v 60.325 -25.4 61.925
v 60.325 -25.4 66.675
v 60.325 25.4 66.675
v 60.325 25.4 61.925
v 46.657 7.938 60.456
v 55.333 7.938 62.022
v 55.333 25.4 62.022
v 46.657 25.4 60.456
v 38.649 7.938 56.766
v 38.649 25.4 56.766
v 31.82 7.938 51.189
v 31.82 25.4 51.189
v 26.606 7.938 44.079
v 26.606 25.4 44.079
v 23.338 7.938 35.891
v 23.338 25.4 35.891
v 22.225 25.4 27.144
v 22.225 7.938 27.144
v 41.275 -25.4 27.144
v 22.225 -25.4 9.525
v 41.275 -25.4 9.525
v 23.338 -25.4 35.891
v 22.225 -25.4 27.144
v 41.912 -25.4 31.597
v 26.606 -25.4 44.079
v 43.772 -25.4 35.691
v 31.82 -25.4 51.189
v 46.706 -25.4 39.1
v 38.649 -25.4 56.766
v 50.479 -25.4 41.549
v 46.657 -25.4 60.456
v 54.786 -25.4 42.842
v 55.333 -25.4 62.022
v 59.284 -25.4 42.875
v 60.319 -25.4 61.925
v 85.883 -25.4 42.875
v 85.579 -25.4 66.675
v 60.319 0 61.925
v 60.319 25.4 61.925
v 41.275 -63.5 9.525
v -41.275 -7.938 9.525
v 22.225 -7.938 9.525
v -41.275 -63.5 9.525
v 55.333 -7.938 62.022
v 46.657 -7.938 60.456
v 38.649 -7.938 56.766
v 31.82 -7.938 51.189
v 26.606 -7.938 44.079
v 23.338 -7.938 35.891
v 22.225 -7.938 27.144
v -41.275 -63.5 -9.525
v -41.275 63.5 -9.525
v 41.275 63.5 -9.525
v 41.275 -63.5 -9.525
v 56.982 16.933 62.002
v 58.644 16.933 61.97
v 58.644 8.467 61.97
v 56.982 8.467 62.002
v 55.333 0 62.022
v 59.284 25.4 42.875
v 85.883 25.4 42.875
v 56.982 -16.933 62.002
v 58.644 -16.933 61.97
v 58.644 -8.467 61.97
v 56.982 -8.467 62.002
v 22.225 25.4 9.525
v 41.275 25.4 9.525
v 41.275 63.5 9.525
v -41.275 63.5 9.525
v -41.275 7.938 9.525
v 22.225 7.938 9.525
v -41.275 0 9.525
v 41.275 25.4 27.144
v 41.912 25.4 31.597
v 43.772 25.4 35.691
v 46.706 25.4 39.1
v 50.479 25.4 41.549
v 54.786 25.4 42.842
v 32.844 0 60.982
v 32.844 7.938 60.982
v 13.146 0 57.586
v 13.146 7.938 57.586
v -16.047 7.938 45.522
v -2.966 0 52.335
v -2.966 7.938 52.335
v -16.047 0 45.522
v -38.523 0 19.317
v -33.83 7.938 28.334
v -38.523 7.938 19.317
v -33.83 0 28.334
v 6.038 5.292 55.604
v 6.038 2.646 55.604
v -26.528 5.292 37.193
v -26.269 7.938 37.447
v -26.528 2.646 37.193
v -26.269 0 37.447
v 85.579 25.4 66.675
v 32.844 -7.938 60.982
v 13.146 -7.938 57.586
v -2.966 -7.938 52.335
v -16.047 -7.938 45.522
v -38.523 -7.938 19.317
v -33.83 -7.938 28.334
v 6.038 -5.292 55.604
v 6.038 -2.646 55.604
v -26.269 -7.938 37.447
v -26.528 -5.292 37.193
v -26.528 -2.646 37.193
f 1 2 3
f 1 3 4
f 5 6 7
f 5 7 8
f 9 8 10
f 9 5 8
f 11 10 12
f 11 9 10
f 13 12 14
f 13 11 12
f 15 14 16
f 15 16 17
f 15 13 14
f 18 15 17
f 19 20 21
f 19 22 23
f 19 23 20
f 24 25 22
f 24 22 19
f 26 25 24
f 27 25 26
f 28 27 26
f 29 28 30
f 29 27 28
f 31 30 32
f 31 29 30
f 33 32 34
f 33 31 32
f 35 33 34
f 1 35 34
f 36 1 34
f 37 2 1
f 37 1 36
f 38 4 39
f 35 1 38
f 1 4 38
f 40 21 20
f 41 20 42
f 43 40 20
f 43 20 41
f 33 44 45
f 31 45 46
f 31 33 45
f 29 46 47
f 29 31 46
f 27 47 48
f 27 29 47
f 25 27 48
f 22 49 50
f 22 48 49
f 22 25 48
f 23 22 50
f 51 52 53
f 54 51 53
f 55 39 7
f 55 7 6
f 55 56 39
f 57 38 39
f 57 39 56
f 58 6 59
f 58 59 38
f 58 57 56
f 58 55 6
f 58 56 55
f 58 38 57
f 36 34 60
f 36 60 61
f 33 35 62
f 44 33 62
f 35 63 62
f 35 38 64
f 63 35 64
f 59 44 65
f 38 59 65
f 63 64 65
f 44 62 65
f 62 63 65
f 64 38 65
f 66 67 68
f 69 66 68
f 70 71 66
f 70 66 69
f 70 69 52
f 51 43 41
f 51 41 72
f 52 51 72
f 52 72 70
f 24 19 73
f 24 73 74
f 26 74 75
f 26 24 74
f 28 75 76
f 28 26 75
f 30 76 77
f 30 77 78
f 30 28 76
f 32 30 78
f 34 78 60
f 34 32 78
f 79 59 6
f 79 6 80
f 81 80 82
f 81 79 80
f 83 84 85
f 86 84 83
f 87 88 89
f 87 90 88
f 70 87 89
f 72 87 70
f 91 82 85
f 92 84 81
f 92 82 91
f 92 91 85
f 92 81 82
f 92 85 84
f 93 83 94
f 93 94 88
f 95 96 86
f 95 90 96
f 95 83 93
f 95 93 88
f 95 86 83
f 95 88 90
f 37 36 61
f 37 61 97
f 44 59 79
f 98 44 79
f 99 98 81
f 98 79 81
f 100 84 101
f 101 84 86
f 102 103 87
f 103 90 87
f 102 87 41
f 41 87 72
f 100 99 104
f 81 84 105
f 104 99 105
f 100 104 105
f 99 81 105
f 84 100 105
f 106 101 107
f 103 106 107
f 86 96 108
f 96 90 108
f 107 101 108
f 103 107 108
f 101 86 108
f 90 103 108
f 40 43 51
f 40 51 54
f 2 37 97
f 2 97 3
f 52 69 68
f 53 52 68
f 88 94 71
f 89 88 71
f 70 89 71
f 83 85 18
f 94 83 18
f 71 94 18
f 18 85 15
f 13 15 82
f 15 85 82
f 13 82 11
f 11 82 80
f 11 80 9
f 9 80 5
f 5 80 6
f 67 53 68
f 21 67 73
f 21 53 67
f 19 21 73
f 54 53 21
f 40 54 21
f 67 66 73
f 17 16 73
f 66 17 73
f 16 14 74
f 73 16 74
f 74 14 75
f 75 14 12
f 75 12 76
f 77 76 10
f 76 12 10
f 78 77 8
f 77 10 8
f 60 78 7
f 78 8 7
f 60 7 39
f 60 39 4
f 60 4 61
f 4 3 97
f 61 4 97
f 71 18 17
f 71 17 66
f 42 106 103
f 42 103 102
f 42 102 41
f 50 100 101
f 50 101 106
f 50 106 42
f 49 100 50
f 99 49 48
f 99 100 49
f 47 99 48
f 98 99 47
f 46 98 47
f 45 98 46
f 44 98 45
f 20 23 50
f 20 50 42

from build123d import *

# Parameters (mm, degrees)
F1_DEPTH = 63.5
F2_DEPTH = 25.4
F3_DEPTH = 7.9375


with BuildPart() as f1:
    # F0 (on Front) → F1 (new body, symmetric)
    with BuildSketch(Plane.XZ):
        Polygon((-41.275, 9.525), (-41.275, -9.525), (41.275, -9.525), (41.275, 9.525), (22.225, 9.525), align=None)
    extrude(amount=F1_DEPTH, both=True)

    # F0 (on Front) → F2 (join, symmetric)
    with BuildSketch(Plane.XZ):
        with BuildLine():
            Line((22.225, 9.525), (41.275, 9.525))
            Line((41.275, 9.525), (41.275, 27.144268))
            ThreePointArc((41.275, 27.144268), (46.70633, 39.100244), (59.283867, 42.8752))
            Line((59.283867, 42.8752), (60.325, 42.8752))
            Line((60.325, 42.8752), (60.325, 61.9252))
            Line((60.325, 61.9252), (60.318968, 61.9252))
            add(Edge.make_bspline(
                [(60.318968, 61.9252), (58.637809, 61.975807), (56.975817, 62.007969), (55.33311, 62.021976)],
                knots=[0, 0, 0, 0, 3.185994, 3.185994, 3.185994, 3.185994], degree=3))
            ThreePointArc((55.33311, 62.021976), (31.820072, 51.189025), (22.225, 27.144268))
            Line((22.225, 27.144268), (22.225, 9.525))
        make_face()
        Polygon((60.325, 66.675), (60.325, 61.9252), (60.325, 42.8752), (85.883424, 42.8752), (85.578844, 66.675), align=None)
    extrude(amount=F2_DEPTH, both=True)

    # F0 (on Front) → F3 (join, symmetric)
    with BuildSketch(Plane.XZ):
        with BuildLine():
            add(Edge.make_bspline(
                [(55.33311, 62.021976), (-1.963501, 62.510512), (-35.799797, 40.911554), (-41.275, 9.525)],
                knots=[3.185994, 3.185994, 3.185994, 3.185994, 114.311484, 114.311484, 114.311484, 114.311484], degree=3))
            Line((-41.275, 9.525), (22.225, 9.525))
            Line((22.225, 9.525), (22.225, 27.144268))
            ThreePointArc((22.225, 27.144268), (31.820072, 51.189025), (55.33311, 62.021976))
        make_face()
    extrude(amount=F3_DEPTH, both=True)


solid = f1.part
